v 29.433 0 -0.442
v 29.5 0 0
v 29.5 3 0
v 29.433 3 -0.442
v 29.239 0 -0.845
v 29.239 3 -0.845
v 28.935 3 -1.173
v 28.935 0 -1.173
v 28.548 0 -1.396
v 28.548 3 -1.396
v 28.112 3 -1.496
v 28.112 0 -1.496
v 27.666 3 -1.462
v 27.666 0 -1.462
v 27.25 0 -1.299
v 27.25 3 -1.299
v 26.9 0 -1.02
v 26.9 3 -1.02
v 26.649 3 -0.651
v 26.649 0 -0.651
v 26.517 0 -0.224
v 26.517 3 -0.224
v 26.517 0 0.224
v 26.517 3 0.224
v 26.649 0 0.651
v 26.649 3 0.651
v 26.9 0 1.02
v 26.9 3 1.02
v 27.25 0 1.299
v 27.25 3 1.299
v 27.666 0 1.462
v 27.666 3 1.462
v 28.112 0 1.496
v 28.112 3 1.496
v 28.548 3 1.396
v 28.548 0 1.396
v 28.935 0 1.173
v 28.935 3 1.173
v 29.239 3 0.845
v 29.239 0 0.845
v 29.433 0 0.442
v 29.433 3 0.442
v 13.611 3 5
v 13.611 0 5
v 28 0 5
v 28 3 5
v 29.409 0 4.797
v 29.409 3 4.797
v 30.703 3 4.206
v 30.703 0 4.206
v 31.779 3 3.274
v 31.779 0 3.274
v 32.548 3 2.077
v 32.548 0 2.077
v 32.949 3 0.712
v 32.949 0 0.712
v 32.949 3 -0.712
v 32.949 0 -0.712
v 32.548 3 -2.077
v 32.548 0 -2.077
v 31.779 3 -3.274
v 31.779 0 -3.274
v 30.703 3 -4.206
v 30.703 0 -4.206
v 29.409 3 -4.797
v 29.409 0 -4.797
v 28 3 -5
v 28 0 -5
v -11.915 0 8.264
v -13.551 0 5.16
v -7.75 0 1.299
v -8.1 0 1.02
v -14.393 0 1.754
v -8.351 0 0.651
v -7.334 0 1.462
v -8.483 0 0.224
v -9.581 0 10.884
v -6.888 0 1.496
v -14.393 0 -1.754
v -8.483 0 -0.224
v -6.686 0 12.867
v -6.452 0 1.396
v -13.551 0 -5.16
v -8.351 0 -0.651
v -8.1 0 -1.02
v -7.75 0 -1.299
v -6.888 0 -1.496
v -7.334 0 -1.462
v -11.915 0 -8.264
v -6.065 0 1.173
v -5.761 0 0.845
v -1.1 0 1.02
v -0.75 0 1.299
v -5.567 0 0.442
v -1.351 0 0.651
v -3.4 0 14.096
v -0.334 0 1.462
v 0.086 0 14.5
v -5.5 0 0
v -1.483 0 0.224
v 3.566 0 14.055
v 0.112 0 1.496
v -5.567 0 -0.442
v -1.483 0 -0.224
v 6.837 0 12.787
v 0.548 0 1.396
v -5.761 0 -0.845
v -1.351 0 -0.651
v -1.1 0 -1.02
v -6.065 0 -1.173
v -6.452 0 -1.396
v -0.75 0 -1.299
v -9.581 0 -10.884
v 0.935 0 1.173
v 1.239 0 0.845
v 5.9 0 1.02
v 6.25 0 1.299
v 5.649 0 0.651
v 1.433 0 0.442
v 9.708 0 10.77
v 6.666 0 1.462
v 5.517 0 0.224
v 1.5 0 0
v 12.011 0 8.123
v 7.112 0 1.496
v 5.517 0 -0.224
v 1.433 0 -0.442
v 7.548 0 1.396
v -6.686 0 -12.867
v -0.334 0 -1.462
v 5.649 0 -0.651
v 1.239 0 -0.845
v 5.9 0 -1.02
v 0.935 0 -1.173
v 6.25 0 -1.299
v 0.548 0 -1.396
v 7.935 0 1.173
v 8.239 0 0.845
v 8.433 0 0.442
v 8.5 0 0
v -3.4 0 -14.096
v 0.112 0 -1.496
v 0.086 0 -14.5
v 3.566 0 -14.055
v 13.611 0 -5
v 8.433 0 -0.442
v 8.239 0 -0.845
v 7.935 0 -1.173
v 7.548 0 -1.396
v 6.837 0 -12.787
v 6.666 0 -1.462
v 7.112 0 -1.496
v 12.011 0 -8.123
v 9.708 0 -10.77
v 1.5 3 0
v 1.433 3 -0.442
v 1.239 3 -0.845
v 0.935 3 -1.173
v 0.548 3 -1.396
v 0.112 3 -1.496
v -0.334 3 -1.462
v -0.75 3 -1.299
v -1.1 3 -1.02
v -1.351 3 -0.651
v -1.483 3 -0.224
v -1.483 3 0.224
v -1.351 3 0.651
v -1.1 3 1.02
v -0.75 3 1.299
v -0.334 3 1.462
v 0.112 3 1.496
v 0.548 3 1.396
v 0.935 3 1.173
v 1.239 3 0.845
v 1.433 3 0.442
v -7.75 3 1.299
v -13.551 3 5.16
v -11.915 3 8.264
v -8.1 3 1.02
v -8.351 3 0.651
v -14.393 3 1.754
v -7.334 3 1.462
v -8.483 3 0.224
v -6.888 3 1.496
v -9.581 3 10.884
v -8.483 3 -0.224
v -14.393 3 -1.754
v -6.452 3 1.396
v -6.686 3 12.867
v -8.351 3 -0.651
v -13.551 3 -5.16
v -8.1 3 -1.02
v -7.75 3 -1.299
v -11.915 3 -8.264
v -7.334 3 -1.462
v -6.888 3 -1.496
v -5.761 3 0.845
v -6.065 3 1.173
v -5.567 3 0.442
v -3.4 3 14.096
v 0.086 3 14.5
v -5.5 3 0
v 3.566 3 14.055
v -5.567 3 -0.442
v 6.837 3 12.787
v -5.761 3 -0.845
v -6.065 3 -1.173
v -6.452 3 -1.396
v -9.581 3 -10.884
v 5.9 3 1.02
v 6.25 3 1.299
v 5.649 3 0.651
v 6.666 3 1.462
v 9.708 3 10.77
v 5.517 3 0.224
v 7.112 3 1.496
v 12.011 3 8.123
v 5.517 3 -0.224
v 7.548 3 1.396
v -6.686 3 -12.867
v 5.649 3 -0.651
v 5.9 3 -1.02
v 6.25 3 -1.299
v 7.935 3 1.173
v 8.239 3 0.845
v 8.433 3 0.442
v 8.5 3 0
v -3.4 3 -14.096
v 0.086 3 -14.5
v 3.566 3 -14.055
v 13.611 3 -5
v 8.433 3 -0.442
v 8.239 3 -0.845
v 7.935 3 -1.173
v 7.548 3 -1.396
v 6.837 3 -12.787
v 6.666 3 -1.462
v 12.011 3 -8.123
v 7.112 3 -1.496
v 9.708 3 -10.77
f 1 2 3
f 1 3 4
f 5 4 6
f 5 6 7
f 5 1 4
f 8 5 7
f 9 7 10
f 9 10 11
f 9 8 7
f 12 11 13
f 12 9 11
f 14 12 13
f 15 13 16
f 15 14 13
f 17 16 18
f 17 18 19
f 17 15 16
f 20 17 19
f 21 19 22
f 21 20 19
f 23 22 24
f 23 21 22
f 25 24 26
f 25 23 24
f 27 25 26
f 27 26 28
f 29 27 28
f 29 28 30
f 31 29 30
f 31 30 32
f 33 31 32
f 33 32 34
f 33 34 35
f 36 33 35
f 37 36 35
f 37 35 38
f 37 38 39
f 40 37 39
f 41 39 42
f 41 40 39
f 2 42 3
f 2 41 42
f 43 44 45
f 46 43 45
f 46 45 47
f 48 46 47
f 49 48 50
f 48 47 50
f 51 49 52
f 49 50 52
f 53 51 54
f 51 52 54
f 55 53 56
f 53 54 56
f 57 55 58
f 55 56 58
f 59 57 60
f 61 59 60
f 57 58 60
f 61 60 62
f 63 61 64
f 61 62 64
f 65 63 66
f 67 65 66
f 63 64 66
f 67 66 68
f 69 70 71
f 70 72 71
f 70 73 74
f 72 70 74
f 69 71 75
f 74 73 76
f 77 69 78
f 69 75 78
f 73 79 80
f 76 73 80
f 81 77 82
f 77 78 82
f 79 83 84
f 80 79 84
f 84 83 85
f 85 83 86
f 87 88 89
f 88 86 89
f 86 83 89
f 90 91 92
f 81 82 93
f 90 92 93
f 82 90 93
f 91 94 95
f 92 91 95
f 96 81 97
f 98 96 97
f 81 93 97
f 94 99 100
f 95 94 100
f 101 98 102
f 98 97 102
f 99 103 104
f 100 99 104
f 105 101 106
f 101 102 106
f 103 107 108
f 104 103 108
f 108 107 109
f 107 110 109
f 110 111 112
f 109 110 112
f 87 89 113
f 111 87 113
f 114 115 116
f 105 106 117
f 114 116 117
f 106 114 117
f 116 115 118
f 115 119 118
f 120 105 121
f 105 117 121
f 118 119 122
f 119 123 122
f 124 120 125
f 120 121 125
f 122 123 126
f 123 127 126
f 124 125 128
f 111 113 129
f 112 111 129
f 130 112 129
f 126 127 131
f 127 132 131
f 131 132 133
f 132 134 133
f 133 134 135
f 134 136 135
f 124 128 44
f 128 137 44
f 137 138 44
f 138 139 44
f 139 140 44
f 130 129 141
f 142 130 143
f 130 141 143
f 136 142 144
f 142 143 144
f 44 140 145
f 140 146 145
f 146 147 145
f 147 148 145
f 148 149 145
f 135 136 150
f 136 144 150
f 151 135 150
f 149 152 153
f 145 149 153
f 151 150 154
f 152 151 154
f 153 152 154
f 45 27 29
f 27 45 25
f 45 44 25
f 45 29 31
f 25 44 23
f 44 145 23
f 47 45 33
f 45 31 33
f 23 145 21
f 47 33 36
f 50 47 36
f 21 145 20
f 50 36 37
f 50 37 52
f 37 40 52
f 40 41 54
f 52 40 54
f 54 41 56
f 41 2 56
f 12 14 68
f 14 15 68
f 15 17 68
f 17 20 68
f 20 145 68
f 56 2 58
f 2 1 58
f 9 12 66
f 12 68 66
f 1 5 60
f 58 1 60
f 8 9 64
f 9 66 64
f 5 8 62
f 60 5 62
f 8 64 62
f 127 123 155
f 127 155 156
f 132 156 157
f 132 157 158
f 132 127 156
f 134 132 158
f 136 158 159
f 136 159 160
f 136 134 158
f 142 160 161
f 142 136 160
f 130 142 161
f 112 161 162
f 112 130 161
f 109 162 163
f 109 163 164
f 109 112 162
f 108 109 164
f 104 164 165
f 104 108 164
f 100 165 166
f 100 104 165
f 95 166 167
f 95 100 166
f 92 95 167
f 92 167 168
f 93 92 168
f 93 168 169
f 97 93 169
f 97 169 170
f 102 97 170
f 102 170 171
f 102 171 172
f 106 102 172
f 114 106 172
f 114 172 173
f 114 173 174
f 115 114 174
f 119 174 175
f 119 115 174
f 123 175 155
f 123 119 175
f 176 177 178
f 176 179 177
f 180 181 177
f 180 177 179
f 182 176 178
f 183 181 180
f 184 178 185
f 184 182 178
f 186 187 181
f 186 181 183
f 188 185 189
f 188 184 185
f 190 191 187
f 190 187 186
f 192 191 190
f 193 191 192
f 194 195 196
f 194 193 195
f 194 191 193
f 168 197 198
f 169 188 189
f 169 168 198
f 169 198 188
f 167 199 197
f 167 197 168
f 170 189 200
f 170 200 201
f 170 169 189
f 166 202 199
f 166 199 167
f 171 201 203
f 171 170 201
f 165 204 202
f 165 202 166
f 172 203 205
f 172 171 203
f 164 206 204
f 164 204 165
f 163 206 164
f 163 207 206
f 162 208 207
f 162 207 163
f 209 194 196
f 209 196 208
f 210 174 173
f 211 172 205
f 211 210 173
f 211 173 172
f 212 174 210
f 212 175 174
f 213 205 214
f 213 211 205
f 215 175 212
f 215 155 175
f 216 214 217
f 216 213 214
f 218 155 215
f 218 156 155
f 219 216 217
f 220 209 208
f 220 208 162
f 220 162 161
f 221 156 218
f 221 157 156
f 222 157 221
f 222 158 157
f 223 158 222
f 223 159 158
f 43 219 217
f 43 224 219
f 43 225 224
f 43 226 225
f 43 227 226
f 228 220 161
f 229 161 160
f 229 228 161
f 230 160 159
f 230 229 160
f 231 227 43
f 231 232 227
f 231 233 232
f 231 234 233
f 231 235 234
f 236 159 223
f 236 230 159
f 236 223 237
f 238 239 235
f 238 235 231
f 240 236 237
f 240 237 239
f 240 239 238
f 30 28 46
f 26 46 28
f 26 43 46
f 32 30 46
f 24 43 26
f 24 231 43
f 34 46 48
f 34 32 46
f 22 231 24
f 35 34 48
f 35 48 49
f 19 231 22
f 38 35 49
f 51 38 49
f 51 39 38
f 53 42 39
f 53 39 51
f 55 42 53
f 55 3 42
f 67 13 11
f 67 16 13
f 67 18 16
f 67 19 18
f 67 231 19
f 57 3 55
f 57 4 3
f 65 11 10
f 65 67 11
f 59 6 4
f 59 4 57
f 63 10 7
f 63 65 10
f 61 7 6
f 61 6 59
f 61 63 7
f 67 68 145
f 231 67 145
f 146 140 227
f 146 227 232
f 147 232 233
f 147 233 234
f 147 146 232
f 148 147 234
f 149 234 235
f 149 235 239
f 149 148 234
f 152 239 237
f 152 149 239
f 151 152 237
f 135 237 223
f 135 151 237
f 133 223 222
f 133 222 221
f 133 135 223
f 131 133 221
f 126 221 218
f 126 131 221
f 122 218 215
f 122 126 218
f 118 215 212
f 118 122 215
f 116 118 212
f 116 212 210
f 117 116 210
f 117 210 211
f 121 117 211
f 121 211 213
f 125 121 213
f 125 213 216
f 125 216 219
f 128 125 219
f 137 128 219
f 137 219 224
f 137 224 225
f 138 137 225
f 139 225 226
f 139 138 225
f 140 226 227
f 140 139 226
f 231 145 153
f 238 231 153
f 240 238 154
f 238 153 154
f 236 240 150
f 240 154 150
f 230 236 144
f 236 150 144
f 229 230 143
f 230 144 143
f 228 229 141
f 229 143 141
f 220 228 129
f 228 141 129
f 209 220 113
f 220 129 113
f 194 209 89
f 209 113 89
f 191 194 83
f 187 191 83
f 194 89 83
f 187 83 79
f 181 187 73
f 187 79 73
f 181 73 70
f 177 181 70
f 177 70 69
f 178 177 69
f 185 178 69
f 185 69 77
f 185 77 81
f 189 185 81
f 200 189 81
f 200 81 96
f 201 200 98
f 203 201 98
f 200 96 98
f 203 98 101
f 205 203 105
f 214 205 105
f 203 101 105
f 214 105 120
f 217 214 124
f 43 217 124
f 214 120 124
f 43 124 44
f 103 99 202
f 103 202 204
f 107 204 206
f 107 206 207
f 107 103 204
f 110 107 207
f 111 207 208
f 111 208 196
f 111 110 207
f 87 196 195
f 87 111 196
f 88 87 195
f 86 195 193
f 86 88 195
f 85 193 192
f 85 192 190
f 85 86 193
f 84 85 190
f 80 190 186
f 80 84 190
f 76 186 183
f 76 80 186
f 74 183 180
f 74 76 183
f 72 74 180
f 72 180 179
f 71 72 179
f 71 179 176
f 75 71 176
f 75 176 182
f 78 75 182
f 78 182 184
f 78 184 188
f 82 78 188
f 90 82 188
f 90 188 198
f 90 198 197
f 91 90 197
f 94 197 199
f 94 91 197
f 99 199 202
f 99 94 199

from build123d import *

# Parameters (mm, degrees)
SKETCH1_R           = 1.5
BOSS_EXTRUDE1_DEPTH = 3


with BuildPart() as part:
    # Sketch1 → Boss-Extrude1 (new body)
    with BuildSketch(Plane(origin=(0, 0, 0), x_dir=(1, 0, 0), z_dir=(0, 1, 0))):
        with BuildLine():
            Line((28, 5), (13.610657589, 5))
            ThreePointArc((13.610657589, 5), (-14.5, 0), (13.610657589, -5))
            Line((13.610657589, -5), (28, -5))
            ThreePointArc((28, -5), (33, 0), (28, 5))
        make_face()
        with Locations((28, 0)):
            Circle(SKETCH1_R, mode=Mode.SUBTRACT)
        Circle(SKETCH1_R, mode=Mode.SUBTRACT)
        with Locations((7, 0)):
            Circle(SKETCH1_R, mode=Mode.SUBTRACT)
        with Locations((-7, 0)):
            Circle(SKETCH1_R, mode=Mode.SUBTRACT)
    extrude(amount=BOSS_EXTRUDE1_DEPTH)


solid = part.part
